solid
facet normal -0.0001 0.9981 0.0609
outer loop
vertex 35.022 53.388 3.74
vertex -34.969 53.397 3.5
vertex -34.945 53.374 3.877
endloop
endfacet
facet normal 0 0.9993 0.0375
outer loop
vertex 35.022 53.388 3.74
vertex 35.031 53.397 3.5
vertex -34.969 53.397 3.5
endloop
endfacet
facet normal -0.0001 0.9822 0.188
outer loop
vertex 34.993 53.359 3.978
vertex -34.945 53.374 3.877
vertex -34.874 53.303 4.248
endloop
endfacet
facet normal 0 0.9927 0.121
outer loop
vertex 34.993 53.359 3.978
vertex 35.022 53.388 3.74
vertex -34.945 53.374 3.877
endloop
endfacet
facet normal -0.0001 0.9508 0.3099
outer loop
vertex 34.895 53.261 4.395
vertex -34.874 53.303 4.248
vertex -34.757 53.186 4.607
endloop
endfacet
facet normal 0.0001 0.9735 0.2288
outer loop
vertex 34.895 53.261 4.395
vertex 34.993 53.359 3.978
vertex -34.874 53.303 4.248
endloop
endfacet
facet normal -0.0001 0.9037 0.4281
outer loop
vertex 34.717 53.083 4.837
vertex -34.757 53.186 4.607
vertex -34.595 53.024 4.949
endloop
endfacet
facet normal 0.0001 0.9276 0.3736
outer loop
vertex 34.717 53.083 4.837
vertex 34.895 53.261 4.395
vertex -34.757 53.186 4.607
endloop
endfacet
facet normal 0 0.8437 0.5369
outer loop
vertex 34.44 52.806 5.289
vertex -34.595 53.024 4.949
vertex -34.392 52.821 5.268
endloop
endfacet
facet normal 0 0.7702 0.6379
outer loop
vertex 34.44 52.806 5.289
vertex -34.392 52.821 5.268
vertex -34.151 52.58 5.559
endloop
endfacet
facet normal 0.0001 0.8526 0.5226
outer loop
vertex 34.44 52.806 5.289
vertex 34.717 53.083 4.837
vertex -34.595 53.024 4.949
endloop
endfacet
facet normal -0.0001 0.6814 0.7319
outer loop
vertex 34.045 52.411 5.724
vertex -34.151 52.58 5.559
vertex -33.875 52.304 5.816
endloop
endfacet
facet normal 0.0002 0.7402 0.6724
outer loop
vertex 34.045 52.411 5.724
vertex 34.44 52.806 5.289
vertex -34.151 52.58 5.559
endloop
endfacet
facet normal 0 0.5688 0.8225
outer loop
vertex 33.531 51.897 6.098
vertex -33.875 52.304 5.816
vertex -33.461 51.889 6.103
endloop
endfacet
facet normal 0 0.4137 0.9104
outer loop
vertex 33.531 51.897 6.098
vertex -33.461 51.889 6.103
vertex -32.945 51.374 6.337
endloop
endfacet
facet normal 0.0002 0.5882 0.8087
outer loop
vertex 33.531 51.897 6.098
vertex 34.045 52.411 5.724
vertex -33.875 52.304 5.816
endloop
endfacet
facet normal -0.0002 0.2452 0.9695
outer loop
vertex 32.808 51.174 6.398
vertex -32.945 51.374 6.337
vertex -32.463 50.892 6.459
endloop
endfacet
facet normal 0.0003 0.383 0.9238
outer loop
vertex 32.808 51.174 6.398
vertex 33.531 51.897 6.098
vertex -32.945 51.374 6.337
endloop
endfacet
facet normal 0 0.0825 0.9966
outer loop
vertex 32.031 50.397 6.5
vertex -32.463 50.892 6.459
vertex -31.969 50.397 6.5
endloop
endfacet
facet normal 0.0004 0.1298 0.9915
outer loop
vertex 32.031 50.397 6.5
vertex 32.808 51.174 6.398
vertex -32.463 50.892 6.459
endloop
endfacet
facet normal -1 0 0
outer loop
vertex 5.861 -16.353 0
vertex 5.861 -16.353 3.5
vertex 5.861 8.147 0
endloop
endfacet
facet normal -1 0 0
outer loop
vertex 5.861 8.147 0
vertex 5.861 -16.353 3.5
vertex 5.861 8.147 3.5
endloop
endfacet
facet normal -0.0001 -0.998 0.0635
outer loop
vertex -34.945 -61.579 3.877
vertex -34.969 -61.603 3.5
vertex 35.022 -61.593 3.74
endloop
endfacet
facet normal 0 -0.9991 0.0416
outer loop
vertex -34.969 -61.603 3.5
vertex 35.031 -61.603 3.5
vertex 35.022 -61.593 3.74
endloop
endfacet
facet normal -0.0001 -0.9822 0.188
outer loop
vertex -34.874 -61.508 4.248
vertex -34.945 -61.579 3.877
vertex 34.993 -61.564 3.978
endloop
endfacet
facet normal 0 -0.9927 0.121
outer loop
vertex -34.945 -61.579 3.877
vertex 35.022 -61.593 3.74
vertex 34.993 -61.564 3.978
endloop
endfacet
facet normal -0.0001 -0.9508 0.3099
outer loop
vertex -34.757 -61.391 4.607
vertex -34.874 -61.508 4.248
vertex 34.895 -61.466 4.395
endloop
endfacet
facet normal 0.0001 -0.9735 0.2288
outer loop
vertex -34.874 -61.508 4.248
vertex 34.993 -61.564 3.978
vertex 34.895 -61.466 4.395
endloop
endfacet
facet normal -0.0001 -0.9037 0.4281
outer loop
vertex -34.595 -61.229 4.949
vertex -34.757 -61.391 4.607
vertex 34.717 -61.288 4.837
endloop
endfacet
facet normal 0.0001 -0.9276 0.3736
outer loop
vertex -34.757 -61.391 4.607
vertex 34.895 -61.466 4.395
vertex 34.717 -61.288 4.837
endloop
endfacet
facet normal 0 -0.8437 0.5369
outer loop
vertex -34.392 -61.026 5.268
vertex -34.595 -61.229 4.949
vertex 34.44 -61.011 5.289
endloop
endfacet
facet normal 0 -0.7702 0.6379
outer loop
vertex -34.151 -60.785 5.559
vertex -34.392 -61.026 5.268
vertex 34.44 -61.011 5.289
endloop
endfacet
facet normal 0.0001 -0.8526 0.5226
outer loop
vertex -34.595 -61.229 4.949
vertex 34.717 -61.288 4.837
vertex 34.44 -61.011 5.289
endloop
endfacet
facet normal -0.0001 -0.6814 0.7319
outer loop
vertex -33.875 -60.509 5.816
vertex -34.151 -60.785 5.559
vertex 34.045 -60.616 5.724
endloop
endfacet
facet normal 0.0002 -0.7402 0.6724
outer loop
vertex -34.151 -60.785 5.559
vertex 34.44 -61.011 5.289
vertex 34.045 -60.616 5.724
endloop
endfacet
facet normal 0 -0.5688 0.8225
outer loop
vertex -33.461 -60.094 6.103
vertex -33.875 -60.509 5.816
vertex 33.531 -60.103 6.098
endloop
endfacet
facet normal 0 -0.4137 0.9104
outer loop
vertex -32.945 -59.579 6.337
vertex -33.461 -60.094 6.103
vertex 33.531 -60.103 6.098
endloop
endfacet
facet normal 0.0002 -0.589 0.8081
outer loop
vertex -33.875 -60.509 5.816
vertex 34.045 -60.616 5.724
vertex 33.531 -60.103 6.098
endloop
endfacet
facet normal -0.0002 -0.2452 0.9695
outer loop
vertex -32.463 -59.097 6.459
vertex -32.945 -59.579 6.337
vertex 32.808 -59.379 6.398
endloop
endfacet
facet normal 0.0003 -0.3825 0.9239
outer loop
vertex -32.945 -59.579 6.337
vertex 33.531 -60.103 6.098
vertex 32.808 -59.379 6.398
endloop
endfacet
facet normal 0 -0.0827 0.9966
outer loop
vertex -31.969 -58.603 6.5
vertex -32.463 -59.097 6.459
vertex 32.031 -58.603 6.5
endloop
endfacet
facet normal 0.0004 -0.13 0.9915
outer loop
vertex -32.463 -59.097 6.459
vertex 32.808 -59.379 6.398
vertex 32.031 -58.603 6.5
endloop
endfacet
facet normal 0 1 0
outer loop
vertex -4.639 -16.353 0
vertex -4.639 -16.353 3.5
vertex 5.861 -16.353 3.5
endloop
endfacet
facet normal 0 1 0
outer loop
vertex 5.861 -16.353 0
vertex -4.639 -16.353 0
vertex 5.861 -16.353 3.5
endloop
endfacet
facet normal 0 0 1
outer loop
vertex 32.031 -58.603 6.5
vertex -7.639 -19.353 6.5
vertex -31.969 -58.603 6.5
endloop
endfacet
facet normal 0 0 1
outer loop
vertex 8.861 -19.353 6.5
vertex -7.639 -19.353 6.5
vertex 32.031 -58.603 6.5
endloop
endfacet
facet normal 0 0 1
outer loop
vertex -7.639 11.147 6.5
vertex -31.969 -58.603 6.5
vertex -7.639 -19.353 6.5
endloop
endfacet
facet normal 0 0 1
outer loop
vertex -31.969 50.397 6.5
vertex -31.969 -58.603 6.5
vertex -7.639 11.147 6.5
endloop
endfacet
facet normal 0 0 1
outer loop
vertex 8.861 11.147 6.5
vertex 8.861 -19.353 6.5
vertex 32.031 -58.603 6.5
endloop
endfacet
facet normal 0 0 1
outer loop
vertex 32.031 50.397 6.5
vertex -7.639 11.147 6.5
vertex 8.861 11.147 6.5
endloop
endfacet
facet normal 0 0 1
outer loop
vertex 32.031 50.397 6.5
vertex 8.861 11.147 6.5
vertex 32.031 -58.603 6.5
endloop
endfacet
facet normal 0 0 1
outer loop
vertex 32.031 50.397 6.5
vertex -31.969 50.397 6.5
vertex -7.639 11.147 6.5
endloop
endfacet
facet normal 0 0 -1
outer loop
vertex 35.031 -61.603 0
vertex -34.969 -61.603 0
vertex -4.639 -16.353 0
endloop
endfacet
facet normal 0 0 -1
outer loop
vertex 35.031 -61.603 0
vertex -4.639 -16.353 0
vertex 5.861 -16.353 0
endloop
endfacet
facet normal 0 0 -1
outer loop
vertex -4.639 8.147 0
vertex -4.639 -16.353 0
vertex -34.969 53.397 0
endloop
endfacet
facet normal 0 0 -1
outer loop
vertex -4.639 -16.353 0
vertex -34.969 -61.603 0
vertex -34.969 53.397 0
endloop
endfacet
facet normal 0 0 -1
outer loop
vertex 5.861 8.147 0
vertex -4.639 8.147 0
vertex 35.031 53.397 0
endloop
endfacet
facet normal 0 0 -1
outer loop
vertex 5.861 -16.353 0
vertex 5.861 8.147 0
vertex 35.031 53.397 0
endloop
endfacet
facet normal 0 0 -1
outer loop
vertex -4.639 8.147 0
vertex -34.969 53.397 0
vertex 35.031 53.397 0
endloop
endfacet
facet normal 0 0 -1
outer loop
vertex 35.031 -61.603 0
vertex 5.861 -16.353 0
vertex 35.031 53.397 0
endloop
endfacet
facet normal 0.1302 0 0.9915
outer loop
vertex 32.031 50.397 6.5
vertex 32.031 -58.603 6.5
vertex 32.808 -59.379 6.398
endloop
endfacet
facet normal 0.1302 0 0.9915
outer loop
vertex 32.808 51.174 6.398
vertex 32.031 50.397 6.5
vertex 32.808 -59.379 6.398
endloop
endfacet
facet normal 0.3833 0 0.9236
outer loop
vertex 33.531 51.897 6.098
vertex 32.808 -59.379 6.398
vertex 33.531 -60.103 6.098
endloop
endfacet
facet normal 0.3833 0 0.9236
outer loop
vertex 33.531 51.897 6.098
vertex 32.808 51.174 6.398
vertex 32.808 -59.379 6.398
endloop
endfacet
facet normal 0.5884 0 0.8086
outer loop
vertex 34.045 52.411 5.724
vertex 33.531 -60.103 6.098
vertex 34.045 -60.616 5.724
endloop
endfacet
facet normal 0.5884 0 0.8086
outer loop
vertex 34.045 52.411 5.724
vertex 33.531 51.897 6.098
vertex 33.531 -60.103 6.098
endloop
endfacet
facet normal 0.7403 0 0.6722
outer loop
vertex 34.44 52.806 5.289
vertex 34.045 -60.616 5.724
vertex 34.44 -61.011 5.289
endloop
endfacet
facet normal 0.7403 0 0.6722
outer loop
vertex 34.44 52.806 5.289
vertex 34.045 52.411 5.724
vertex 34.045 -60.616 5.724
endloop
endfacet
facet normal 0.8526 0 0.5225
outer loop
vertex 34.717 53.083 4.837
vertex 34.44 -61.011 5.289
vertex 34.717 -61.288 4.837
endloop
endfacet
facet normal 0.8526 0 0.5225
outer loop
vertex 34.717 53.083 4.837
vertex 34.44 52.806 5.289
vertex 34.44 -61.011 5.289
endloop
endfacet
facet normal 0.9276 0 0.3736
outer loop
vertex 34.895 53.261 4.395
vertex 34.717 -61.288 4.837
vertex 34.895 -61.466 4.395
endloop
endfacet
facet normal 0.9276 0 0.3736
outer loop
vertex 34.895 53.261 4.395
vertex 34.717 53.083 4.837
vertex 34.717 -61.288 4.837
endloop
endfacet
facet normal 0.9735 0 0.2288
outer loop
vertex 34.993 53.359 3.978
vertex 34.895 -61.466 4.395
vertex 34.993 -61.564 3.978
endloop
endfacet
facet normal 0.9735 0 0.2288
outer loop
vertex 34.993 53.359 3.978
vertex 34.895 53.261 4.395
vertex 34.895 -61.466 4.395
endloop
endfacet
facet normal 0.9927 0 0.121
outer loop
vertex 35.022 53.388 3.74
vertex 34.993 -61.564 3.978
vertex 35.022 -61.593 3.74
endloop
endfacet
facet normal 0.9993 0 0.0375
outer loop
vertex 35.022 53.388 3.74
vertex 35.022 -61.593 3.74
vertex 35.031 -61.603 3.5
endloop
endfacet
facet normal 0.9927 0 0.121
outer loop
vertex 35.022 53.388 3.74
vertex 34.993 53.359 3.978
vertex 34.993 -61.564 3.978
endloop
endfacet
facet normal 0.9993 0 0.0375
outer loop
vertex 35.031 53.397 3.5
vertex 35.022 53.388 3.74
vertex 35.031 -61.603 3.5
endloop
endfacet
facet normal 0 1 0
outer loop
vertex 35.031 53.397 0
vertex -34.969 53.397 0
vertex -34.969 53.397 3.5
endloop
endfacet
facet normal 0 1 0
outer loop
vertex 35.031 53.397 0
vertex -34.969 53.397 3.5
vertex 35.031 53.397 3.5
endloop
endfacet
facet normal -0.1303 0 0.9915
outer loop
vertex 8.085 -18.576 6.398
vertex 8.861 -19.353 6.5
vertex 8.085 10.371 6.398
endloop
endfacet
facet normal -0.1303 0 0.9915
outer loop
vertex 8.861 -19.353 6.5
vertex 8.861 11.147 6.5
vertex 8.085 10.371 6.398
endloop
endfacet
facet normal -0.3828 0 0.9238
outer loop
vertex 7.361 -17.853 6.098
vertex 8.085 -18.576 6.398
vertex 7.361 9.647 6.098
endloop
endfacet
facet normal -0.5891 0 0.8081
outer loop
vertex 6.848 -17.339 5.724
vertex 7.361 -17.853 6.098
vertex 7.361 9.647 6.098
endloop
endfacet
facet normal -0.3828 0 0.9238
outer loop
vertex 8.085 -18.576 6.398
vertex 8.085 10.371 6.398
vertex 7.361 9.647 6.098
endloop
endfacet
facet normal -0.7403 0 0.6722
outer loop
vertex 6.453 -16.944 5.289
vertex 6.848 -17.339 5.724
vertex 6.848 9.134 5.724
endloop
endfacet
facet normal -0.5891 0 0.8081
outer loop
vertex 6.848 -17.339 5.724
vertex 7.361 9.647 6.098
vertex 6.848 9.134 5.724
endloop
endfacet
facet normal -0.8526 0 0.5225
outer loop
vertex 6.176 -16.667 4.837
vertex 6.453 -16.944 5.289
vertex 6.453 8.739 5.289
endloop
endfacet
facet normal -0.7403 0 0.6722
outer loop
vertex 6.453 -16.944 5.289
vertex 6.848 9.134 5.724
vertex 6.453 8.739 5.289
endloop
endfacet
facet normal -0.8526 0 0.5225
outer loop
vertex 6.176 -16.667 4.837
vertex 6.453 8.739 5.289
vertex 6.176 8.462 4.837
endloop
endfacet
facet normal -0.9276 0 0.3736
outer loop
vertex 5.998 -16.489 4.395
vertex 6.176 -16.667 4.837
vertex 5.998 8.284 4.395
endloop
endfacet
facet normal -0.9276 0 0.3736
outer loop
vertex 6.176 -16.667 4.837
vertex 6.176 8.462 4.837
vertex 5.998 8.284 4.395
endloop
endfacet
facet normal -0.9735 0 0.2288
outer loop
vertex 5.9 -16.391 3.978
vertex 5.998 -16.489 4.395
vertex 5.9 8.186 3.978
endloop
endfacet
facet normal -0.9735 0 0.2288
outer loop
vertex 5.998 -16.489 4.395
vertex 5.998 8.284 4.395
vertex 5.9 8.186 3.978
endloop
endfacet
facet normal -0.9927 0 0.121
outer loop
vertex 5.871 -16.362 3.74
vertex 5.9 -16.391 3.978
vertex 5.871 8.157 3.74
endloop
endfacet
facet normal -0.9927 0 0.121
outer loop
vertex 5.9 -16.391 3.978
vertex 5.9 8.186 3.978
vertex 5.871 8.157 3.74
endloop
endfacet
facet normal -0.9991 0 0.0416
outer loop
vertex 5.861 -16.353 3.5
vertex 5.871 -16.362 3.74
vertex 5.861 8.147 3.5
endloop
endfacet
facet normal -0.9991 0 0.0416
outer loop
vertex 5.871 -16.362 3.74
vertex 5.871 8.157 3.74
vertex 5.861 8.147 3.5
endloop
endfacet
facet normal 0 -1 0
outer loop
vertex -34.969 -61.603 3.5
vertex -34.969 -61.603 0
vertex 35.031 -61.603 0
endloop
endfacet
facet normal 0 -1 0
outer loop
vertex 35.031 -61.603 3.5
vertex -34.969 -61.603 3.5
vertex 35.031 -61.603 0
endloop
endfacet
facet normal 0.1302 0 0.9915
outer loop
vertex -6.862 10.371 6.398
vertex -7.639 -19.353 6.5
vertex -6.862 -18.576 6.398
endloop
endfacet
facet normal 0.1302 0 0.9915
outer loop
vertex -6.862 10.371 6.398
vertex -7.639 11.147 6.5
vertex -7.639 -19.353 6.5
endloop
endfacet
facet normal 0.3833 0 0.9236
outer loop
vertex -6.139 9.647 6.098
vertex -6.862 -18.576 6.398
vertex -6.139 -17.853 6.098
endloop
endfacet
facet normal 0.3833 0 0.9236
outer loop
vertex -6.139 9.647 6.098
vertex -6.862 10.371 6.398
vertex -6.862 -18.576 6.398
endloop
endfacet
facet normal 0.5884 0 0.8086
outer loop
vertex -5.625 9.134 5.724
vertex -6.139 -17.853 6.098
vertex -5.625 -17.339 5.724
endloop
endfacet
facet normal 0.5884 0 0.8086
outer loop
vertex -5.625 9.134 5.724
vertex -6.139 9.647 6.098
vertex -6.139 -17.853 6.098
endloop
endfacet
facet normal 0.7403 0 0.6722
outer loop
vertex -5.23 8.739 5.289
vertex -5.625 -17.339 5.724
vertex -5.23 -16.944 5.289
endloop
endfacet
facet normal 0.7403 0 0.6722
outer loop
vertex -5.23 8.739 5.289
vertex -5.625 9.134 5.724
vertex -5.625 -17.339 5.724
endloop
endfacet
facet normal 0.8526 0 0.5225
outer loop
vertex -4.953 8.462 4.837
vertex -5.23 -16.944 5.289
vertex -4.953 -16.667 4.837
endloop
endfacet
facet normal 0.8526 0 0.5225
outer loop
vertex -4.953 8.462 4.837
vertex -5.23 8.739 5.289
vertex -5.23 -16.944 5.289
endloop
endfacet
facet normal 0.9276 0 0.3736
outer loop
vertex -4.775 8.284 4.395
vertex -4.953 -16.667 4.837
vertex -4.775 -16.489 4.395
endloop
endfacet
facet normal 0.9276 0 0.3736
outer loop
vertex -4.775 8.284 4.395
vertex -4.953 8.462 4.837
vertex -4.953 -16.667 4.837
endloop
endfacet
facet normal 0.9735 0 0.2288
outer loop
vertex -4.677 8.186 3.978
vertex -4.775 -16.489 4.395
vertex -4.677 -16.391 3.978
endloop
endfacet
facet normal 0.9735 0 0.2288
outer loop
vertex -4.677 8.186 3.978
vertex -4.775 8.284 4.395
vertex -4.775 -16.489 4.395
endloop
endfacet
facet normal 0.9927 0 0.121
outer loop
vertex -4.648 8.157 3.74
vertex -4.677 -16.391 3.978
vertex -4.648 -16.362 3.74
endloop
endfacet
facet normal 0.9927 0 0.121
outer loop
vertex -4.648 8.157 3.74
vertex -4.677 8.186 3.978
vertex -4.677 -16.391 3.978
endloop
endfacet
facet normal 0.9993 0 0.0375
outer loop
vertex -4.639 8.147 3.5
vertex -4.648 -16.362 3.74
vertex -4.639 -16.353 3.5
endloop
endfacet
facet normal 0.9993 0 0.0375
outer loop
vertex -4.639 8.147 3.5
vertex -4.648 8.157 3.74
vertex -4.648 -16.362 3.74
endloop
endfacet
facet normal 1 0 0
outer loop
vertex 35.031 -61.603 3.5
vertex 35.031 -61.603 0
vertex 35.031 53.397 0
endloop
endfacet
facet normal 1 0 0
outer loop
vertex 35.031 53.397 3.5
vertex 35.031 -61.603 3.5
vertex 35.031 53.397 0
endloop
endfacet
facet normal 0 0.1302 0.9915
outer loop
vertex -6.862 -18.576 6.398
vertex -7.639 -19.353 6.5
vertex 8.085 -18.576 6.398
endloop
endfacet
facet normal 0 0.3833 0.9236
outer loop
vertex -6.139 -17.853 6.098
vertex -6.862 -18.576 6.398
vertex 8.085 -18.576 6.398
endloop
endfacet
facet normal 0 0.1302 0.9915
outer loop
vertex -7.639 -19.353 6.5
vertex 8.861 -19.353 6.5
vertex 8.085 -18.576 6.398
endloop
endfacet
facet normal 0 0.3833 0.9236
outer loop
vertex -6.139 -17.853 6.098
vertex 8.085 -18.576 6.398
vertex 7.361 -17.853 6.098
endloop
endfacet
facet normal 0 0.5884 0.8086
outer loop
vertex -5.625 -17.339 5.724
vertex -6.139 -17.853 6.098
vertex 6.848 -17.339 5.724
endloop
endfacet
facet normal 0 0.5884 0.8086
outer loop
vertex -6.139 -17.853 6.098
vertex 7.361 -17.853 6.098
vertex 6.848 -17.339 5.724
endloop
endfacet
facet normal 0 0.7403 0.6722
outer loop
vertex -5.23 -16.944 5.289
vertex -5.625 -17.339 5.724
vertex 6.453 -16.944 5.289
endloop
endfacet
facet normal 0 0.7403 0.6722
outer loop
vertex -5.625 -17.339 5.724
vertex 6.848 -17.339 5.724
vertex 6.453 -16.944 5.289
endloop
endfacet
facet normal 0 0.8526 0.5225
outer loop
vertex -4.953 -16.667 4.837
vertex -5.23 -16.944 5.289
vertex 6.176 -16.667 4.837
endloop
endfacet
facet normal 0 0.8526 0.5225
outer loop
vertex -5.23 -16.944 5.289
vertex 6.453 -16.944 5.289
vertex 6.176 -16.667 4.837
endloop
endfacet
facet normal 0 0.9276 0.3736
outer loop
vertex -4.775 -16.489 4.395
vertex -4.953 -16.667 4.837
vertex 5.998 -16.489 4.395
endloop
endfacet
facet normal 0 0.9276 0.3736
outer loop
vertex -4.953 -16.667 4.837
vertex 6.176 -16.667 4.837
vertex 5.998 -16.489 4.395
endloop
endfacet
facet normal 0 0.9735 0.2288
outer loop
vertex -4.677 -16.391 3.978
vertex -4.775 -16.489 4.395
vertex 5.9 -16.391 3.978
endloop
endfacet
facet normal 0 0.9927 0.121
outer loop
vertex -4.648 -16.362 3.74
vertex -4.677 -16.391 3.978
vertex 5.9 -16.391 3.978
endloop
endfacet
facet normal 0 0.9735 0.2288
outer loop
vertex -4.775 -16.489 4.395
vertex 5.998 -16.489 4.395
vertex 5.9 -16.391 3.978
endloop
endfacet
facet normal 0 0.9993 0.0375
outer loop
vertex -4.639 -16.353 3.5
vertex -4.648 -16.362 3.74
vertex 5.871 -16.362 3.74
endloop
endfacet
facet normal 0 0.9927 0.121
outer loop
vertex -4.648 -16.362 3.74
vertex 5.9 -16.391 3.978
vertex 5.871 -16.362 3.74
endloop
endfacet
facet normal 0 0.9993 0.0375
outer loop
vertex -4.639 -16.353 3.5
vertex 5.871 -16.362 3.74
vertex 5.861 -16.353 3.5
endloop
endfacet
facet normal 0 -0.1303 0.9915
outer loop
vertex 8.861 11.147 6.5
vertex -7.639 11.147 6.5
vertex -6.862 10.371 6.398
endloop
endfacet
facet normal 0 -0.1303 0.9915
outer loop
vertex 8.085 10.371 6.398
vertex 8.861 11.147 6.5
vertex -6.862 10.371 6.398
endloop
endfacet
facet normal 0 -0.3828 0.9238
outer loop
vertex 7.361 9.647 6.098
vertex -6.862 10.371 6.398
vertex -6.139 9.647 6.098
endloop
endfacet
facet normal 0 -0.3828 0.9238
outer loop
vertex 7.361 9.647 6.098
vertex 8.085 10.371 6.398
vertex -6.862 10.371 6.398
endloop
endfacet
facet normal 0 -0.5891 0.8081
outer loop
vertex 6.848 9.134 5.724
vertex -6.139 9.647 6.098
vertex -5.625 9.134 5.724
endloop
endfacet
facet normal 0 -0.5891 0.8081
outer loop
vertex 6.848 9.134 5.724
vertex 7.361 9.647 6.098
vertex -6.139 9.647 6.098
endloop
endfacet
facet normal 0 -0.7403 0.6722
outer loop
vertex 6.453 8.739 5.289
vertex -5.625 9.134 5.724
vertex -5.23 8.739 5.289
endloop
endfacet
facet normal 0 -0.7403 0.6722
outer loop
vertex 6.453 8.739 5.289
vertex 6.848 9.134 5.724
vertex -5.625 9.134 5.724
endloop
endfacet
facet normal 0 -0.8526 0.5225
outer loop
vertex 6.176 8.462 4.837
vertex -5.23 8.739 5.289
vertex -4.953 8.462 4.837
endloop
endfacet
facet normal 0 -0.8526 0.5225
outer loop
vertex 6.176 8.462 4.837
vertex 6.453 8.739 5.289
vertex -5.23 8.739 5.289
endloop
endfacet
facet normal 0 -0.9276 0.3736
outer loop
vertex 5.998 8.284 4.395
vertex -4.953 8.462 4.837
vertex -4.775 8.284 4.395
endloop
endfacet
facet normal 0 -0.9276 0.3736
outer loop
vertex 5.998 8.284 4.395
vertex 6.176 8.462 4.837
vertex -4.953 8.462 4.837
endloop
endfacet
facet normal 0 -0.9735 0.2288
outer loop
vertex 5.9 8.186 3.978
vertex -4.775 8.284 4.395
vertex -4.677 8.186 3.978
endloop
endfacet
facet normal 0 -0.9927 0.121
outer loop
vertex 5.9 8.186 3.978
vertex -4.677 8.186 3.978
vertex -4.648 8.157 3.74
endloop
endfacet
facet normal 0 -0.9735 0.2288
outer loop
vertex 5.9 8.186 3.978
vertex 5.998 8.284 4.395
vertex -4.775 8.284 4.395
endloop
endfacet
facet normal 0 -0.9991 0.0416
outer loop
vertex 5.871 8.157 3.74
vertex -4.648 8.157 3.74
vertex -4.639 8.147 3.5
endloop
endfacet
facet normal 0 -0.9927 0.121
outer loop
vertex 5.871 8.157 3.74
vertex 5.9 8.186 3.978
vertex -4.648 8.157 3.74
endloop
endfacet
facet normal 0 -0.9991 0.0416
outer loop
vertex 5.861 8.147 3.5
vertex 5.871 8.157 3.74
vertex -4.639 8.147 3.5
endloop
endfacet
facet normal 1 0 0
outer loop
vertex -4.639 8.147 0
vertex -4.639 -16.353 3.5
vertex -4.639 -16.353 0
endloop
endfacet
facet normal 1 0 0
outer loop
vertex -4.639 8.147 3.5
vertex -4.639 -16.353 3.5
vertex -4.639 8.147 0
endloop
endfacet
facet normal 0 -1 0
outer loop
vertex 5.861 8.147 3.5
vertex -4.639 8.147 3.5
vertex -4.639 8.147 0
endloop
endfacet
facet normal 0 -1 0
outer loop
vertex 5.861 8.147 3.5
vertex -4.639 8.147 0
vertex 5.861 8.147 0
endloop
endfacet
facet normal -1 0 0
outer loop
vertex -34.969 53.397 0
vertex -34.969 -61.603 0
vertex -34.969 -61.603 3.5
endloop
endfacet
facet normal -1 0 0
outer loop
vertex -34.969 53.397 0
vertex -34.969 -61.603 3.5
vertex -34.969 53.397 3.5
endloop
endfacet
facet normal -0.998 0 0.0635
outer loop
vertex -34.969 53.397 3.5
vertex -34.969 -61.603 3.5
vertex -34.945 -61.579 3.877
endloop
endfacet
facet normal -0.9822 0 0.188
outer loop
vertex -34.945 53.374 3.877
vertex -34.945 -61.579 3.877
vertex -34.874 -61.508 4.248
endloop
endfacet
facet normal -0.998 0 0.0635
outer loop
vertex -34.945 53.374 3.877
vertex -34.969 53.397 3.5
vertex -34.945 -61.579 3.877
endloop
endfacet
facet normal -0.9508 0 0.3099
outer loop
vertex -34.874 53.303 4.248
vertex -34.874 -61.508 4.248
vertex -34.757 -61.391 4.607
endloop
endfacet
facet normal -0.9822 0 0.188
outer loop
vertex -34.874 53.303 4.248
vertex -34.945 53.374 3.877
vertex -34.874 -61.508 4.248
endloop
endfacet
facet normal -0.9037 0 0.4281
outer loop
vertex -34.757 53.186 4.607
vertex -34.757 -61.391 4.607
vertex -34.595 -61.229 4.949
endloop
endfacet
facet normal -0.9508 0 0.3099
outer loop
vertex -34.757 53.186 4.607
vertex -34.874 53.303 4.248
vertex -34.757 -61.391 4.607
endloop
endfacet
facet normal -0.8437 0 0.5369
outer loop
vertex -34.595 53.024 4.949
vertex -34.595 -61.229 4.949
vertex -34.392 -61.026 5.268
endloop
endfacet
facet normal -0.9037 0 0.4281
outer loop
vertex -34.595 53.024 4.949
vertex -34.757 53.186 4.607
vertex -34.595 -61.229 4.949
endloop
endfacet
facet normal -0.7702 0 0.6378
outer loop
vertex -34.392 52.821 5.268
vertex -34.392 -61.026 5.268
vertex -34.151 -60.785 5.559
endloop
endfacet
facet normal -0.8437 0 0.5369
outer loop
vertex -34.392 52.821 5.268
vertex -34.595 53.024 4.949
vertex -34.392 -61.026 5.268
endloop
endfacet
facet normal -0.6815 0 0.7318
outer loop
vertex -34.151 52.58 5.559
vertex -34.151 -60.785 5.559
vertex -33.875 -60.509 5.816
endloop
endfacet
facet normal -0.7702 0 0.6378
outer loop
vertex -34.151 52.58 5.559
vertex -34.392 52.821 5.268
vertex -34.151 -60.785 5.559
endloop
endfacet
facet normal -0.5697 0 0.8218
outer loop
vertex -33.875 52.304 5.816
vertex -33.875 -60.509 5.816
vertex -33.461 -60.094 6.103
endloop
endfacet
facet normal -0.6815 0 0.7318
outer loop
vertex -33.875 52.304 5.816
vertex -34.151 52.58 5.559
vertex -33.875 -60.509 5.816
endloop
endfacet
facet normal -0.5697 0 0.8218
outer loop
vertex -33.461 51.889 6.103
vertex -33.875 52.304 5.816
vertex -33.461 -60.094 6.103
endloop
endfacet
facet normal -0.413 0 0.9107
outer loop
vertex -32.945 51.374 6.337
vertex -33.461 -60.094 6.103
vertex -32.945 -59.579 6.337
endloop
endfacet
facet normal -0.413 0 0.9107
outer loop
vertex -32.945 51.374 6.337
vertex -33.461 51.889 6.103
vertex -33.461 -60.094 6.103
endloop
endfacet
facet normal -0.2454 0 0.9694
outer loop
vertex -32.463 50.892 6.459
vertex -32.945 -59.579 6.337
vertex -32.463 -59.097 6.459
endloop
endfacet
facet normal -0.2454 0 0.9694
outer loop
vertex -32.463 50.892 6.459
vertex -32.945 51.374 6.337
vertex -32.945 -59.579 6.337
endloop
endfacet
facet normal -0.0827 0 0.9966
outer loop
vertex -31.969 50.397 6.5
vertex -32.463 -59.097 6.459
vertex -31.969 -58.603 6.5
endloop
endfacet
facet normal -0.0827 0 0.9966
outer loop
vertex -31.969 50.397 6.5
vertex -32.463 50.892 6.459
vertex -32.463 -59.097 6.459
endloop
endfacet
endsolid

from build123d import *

# Parameters (mm, degrees)
F0_W     = 70
F0_H     = 115
F1_DEPTH = 6.5
F2_W     = 10.5
F2_H     = 24.5
F3_DEPTH = 6.5
F4_R     = 3


with BuildPart() as f1:
    # F0 (on Top) → F1 (new body)
    with BuildSketch(Plane.XY):
        with Locations((0.0314470381, -4.1025115179)):
            Rectangle(F0_W, F0_H)
    extrude(amount=F1_DEPTH)

    # F2 (on face) → F3 (cut, through all)
    with BuildSketch(Plane.XY.offset(6.5)):
        with Locations((0.6114470381, -4.1025115179)):
            Rectangle(F2_W, F2_H)
    extrude(amount=-F3_DEPTH, mode=Mode.SUBTRACT)

    # F4
    f4_edges = [f1.edges().sort_by_distance(p)[0] for p in [
        (35.031447, -4.102512, 6.5),
        (0.031447, -61.602512, 6.5),
        (0.031447, 53.397488, 6.5),
        (-34.968553, -4.102512, 6.5),
        (-4.638553, -4.102512, 6.5),
        (0.611447, -16.352512, 6.5),
        (5.861447, -4.102512, 6.5),
        (0.611447, 8.147488, 6.5),
    ]]
    fillet(f4_edges, radius=F4_R)


solid = f1.part
